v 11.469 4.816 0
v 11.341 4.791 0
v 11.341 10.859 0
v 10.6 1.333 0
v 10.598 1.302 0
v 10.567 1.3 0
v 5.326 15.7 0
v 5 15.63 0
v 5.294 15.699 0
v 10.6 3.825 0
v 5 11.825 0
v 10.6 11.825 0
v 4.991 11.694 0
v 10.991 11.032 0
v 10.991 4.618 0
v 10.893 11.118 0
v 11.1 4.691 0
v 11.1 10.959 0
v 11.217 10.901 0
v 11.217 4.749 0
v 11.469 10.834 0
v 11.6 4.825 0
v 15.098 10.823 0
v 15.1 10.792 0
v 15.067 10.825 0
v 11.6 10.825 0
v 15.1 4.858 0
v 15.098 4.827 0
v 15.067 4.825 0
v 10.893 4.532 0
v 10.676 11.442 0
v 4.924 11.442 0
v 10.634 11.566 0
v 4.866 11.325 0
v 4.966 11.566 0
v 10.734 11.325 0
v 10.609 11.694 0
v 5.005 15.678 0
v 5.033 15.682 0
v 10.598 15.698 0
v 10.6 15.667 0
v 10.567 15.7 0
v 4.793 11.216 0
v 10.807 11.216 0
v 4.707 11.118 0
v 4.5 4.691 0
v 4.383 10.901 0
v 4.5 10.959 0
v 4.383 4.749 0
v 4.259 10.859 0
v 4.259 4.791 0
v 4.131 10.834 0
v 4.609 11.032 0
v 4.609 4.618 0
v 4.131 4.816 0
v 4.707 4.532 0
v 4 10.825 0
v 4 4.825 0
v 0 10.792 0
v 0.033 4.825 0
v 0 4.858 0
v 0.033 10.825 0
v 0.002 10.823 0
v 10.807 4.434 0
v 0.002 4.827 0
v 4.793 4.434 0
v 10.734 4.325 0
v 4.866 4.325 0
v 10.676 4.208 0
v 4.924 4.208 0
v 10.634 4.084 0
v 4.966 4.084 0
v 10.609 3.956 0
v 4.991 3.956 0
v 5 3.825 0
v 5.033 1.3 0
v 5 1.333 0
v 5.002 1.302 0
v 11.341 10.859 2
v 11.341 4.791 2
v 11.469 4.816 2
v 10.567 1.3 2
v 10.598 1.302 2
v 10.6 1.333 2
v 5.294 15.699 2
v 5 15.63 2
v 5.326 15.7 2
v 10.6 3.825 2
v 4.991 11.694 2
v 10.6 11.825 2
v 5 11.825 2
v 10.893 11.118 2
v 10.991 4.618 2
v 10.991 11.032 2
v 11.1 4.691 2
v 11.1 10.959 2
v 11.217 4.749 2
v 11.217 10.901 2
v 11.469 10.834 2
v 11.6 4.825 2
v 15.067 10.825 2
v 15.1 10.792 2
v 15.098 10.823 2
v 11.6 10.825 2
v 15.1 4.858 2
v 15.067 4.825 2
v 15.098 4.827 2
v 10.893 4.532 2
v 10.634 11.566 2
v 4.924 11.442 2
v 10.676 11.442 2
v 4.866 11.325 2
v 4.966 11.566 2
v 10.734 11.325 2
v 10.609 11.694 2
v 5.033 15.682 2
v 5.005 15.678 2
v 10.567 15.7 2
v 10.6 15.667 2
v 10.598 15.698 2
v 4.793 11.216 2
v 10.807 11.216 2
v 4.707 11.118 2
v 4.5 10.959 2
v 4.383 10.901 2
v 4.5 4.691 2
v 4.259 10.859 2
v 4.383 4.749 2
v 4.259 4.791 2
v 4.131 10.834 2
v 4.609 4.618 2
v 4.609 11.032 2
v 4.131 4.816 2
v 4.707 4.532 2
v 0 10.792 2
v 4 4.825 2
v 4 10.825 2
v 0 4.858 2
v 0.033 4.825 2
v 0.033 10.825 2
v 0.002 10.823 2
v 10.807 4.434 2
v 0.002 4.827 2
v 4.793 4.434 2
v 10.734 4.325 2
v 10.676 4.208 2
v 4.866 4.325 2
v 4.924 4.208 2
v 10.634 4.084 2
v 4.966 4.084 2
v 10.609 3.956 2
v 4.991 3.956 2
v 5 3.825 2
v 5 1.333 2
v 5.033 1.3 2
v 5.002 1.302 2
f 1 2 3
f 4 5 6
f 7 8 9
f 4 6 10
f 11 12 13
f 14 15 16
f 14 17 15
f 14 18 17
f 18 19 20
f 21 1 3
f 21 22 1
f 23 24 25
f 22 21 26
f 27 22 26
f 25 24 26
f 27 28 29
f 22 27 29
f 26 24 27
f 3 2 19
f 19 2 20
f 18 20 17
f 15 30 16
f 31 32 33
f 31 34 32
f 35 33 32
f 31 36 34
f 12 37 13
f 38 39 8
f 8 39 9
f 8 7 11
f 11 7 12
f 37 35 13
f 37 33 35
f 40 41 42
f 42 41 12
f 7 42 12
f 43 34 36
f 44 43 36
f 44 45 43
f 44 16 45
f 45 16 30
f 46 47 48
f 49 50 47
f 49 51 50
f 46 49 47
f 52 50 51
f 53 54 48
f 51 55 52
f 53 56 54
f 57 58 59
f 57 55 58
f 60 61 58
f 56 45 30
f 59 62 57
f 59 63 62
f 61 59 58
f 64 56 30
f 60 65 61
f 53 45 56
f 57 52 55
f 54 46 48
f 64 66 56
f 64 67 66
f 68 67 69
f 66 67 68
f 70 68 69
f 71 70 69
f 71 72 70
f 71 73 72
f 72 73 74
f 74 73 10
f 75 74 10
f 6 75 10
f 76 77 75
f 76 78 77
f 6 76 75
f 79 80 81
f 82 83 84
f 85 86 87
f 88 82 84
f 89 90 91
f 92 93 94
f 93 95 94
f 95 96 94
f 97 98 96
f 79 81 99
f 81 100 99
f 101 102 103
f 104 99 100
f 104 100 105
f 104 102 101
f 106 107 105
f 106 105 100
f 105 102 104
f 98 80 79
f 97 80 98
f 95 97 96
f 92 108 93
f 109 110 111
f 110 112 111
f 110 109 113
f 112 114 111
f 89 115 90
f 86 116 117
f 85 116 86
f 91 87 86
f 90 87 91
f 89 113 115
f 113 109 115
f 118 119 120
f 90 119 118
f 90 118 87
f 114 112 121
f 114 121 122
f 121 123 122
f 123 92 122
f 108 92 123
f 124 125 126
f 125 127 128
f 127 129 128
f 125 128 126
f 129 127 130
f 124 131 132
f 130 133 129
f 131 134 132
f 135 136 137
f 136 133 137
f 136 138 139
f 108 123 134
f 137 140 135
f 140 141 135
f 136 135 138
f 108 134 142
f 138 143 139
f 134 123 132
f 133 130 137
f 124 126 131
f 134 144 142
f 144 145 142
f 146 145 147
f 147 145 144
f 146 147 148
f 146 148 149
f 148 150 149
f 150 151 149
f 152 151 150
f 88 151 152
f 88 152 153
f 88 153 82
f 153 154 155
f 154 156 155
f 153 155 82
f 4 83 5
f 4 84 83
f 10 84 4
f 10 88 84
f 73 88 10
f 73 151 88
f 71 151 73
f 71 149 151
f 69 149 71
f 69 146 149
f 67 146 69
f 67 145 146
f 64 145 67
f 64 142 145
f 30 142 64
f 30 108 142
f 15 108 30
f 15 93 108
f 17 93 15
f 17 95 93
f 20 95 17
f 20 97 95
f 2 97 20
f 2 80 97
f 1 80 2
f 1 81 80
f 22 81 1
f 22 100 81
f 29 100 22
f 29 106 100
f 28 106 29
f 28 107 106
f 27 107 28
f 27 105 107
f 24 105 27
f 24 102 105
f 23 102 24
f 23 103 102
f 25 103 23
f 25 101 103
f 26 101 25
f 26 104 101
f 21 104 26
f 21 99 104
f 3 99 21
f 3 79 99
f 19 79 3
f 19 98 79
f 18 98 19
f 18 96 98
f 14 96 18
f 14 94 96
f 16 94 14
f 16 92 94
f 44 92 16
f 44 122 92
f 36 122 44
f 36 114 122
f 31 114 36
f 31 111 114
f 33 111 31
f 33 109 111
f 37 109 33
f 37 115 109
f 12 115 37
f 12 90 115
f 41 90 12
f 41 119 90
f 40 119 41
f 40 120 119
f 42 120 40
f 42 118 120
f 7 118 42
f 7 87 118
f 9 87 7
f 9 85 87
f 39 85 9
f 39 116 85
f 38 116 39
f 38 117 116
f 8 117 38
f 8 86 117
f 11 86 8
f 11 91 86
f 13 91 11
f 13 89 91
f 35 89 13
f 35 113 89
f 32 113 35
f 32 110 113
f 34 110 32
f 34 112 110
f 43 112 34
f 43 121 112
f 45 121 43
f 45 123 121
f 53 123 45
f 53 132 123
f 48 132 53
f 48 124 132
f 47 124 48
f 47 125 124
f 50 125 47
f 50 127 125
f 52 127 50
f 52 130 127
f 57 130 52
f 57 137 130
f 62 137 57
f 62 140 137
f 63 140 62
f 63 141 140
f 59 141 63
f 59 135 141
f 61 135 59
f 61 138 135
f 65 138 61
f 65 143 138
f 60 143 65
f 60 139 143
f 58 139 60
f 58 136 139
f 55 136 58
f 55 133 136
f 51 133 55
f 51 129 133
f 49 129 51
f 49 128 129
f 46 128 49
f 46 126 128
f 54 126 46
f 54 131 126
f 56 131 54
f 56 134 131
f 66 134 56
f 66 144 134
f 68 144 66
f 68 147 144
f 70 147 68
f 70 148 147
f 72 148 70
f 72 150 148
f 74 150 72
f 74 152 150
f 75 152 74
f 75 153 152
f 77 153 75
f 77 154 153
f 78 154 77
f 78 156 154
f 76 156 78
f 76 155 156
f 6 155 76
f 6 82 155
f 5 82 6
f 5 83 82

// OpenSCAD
// file: touchid_params.scad
// ============================================================
// Touch ID モジュール取付プレート + 十字フット のパラメータ
// 座標系: 上から見た形 / 原点=外形バウンディングボックスの南西角 / +Z=天面側
// 寸法はモジュール実物に合わせた実測値
// ============================================================

// ---------- プレート外形 ----------
touchid_plate_w = 15.6;   // 幅
touchid_plate_d = 16.0;   // 奥行き
touchid_plate_t = 0.9;    // 板厚(ネジ穴が貫通する厚み)
touchid_r_corner = 1.8;   // 南西・南東・北東の角R
touchid_r_nw     = 5.3;   // 北西の角R(ここだけ大きい)

// 南辺の切欠き(ケーブル逃げ)
touchid_notch_x  = [4.8, 10.8];
touchid_notch_d  = 1.0;

// ---------- ネジ穴 ----------
// 超低頭ネジ。軸φ1.8が通り、頭φ2.72がプレート裏に露出する
touchid_hole_d = 2.5;     // 通し穴。φ2.7では頭が座らず抜ける
touchid_head_d = 2.72;    // 頭径(実測)
touchid_hole_x = [3.0, 12.6];
touchid_hole_y = [2.65, 13.0];

// ---------- 天面のボス(モジュールの当たり面) ----------
touchid_boss_d = 3.0;
touchid_boss_h = 0.15;

// ---------- 十字フット ----------
touchid_foot_h        = 2.0;   // プレート裏に噛ませるスペーサ厚
touchid_foot_head_clr = 0.64;  // ネジ頭の外周からフットまでの逃げ
touchid_foot_fillet   = 1.0;   // 十字の内隅R(応力集中よけ)
touchid_foot_edge_clr = 0.3;   // Y方向バー端をプレート外形から控える量
touchid_foot_xbar     = [[0, 15.1], 3.0];  // [Xの範囲, ネジ列中心からの半幅]

// ---------- 導出 ----------
touchid_holes = [for (y = touchid_hole_y, x = touchid_hole_x) [x, y]];
touchid_hole_cx = (touchid_hole_x[0] + touchid_hole_x[1]) / 2;
touchid_hole_cy = (touchid_hole_y[0] + touchid_hole_y[1]) / 2;
// 穴中心から確保すべき逃げ半径(ネジ穴ではなく「裏に出る頭」で決まる)
touchid_head_r = touchid_head_d / 2 + touchid_foot_head_clr;
// file: ../params.scad
// ============================================================
// Keyball61 ラップボード 共通パラメータ (v4で使用する項目のみ)
// 座標系: X+ = 右(東), Y+ = 奥(北), Z+ = 上
// 組立座標系(グローバル): 中心 x=0, 手前が y小
// 旧v2(固定式楔)・v3(中空モジュール)のパラメータはgit履歴を参照
// ============================================================

clr = 0.35;           // はめあいクリアランス(片側)

// ---------- 全体レイアウト ----------
splay        = 10;    // ハの字角(固定)。変更したら全パーツ再印刷
tent_angle   = 7;     // テンティング角(内側が高い)
kb_corner_x  = 45;    // キーボードブロック後内側コーナーの中心からの距離
                      // (v4は v4_corner_x = kb_corner_x - 25 を使用)
kb_corner_y  = 238;   // 同コーナーのY

// ---------- キーボード搭載部 ----------
kb_wall      = 6;     // アクリル外形の周囲マージン(外形の配置オフセット)
wedge_t0     = 6;     // 楔面の基準肉厚(lib.scadの傾斜面定義で使用)
plate_t      = 2;     // 取付プレート厚(=アクリル板厚。純正ネジ長がそのまま使える)
pocket_depth = 4.6;   // lib.scadの座面高さ定義で使用

// ---------- パームレスト ----------
palm_w       = 108;   // パームレスト幅
palm_x0      = 2.5;   // パームの外側エッジ位置(kbフレームx)
palm_d       = 88;    // 同奥行き
palm_overlap = 3;     // キーボードブロックへの食い込み
palm_r       = 18;    // 角R

// ---------- 穴径 ----------
ball_hole_d  = 12;    // ボール取出し穴(アクリルは11.3)
m2_hole_d  = 2.4;     // M2クリアランス(プレート側)
bc_hole_d  = 2.8;     // ボールケースネジ(プレート側, アクリルは2.36)

// M3 (ジョイント・カバー固定)
m3_hole_d  = 3.4;
m3_cs_d    = 6.8;     // 皿ざぐり径
m3_nut_af  = 5.8;     // 六角ナットポケット対辺(M3ナット5.5+0.3)
m3_nut_t   = 2.9;     // 同深さ

$fn = 48;
// file: touchid_plate.scad
// Touch ID モジュール取付プレート
// 底面が完全な平面なので、そのままベタ置きで印刷できる。
// 天面中央のボスは0.15mmしかないため積層0.15mm以下で印刷すること。
include <../params.scad>
include <touchid_params.scad>

// 外形: 角Rの異なる丸角矩形 - 南辺の切欠き
module touchid_outline_2d() {
    rc = touchid_r_corner;
    difference() {
        hull() {
            translate([rc, rc])                              circle(r = rc);
            translate([touchid_plate_w - rc, rc])             circle(r = rc);
            translate([touchid_plate_w - rc, touchid_plate_d - rc]) circle(r = rc);
            translate([touchid_r_nw, touchid_plate_d - touchid_r_nw])
                circle(r = touchid_r_nw);
        }
        translate([touchid_notch_x[0], -1])
            square([touchid_notch_x[1] - touchid_notch_x[0], 1 + touchid_notch_d]);
    }
}

module touchid_plate(hole_d = touchid_hole_d) {
    difference() {
        union() {
            linear_extrude(touchid_plate_t) touchid_outline_2d();
            translate([touchid_hole_cx, touchid_hole_cy, touchid_plate_t])
                cylinder(d = touchid_boss_d, h = touchid_boss_h);
        }
        for (h = touchid_holes)
            translate([h[0], h[1], -1])
                cylinder(d = hole_d, h = touchid_plate_t + 2);
    }
}
// file: touchid_foot.scad
// Touch ID 取付プレート裏の十字フット(2mmスペーサ)
// 単純な角柱の足だと短辺6mmで倒れるため、直交バーを足して支持スパンを広げたもの。
// バー幅を決めているのはネジ穴ではなく「プレート裏に露出する超低頭ネジの頭」で、
// 穴中心から touchid_head_r を空ける。
include <touchid_plate.scad>

// X方向バー = 元からある支持帯(左端はプレート外形と面一のまま残す)
// Y方向バー = 左右のネジ穴列から touchid_head_r を空けた帯
touchid_ybar_hw = (touchid_hole_x[1] - touchid_hole_x[0]) / 2 - touchid_head_r;

module _touchid_band(b) translate(b[0]) square([b[1][0] - b[0][0], b[1][1] - b[0][1]]);

module touchid_foot_2d() {
    xb = touchid_foot_xbar;
    // closing(膨張->収縮)で内隅だけにRが付く。外周の寸法は変わらない
    offset(r = -touchid_foot_fillet) offset(r = touchid_foot_fillet)
    union() {
        _touchid_band([[xb[0][0], touchid_hole_cy - xb[1]],
                       [xb[0][1], touchid_hole_cy + xb[1]]]);
        intersection() {
            _touchid_band([[touchid_hole_cx - touchid_ybar_hw, -1],
                           [touchid_hole_cx + touchid_ybar_hw, touchid_plate_d + 1]]);
            // プレート外形(南辺の切欠きを含む)から控えて端を決める
            offset(r = -touchid_foot_edge_clr) touchid_outline_2d();
        }
    }
}

module touchid_foot() linear_extrude(touchid_foot_h) touchid_foot_2d();
// main file
include <touchid_foot.scad>
// 上下ともフラットな2mm板。ベタ置き(サポート不要)
touchid_foot();
